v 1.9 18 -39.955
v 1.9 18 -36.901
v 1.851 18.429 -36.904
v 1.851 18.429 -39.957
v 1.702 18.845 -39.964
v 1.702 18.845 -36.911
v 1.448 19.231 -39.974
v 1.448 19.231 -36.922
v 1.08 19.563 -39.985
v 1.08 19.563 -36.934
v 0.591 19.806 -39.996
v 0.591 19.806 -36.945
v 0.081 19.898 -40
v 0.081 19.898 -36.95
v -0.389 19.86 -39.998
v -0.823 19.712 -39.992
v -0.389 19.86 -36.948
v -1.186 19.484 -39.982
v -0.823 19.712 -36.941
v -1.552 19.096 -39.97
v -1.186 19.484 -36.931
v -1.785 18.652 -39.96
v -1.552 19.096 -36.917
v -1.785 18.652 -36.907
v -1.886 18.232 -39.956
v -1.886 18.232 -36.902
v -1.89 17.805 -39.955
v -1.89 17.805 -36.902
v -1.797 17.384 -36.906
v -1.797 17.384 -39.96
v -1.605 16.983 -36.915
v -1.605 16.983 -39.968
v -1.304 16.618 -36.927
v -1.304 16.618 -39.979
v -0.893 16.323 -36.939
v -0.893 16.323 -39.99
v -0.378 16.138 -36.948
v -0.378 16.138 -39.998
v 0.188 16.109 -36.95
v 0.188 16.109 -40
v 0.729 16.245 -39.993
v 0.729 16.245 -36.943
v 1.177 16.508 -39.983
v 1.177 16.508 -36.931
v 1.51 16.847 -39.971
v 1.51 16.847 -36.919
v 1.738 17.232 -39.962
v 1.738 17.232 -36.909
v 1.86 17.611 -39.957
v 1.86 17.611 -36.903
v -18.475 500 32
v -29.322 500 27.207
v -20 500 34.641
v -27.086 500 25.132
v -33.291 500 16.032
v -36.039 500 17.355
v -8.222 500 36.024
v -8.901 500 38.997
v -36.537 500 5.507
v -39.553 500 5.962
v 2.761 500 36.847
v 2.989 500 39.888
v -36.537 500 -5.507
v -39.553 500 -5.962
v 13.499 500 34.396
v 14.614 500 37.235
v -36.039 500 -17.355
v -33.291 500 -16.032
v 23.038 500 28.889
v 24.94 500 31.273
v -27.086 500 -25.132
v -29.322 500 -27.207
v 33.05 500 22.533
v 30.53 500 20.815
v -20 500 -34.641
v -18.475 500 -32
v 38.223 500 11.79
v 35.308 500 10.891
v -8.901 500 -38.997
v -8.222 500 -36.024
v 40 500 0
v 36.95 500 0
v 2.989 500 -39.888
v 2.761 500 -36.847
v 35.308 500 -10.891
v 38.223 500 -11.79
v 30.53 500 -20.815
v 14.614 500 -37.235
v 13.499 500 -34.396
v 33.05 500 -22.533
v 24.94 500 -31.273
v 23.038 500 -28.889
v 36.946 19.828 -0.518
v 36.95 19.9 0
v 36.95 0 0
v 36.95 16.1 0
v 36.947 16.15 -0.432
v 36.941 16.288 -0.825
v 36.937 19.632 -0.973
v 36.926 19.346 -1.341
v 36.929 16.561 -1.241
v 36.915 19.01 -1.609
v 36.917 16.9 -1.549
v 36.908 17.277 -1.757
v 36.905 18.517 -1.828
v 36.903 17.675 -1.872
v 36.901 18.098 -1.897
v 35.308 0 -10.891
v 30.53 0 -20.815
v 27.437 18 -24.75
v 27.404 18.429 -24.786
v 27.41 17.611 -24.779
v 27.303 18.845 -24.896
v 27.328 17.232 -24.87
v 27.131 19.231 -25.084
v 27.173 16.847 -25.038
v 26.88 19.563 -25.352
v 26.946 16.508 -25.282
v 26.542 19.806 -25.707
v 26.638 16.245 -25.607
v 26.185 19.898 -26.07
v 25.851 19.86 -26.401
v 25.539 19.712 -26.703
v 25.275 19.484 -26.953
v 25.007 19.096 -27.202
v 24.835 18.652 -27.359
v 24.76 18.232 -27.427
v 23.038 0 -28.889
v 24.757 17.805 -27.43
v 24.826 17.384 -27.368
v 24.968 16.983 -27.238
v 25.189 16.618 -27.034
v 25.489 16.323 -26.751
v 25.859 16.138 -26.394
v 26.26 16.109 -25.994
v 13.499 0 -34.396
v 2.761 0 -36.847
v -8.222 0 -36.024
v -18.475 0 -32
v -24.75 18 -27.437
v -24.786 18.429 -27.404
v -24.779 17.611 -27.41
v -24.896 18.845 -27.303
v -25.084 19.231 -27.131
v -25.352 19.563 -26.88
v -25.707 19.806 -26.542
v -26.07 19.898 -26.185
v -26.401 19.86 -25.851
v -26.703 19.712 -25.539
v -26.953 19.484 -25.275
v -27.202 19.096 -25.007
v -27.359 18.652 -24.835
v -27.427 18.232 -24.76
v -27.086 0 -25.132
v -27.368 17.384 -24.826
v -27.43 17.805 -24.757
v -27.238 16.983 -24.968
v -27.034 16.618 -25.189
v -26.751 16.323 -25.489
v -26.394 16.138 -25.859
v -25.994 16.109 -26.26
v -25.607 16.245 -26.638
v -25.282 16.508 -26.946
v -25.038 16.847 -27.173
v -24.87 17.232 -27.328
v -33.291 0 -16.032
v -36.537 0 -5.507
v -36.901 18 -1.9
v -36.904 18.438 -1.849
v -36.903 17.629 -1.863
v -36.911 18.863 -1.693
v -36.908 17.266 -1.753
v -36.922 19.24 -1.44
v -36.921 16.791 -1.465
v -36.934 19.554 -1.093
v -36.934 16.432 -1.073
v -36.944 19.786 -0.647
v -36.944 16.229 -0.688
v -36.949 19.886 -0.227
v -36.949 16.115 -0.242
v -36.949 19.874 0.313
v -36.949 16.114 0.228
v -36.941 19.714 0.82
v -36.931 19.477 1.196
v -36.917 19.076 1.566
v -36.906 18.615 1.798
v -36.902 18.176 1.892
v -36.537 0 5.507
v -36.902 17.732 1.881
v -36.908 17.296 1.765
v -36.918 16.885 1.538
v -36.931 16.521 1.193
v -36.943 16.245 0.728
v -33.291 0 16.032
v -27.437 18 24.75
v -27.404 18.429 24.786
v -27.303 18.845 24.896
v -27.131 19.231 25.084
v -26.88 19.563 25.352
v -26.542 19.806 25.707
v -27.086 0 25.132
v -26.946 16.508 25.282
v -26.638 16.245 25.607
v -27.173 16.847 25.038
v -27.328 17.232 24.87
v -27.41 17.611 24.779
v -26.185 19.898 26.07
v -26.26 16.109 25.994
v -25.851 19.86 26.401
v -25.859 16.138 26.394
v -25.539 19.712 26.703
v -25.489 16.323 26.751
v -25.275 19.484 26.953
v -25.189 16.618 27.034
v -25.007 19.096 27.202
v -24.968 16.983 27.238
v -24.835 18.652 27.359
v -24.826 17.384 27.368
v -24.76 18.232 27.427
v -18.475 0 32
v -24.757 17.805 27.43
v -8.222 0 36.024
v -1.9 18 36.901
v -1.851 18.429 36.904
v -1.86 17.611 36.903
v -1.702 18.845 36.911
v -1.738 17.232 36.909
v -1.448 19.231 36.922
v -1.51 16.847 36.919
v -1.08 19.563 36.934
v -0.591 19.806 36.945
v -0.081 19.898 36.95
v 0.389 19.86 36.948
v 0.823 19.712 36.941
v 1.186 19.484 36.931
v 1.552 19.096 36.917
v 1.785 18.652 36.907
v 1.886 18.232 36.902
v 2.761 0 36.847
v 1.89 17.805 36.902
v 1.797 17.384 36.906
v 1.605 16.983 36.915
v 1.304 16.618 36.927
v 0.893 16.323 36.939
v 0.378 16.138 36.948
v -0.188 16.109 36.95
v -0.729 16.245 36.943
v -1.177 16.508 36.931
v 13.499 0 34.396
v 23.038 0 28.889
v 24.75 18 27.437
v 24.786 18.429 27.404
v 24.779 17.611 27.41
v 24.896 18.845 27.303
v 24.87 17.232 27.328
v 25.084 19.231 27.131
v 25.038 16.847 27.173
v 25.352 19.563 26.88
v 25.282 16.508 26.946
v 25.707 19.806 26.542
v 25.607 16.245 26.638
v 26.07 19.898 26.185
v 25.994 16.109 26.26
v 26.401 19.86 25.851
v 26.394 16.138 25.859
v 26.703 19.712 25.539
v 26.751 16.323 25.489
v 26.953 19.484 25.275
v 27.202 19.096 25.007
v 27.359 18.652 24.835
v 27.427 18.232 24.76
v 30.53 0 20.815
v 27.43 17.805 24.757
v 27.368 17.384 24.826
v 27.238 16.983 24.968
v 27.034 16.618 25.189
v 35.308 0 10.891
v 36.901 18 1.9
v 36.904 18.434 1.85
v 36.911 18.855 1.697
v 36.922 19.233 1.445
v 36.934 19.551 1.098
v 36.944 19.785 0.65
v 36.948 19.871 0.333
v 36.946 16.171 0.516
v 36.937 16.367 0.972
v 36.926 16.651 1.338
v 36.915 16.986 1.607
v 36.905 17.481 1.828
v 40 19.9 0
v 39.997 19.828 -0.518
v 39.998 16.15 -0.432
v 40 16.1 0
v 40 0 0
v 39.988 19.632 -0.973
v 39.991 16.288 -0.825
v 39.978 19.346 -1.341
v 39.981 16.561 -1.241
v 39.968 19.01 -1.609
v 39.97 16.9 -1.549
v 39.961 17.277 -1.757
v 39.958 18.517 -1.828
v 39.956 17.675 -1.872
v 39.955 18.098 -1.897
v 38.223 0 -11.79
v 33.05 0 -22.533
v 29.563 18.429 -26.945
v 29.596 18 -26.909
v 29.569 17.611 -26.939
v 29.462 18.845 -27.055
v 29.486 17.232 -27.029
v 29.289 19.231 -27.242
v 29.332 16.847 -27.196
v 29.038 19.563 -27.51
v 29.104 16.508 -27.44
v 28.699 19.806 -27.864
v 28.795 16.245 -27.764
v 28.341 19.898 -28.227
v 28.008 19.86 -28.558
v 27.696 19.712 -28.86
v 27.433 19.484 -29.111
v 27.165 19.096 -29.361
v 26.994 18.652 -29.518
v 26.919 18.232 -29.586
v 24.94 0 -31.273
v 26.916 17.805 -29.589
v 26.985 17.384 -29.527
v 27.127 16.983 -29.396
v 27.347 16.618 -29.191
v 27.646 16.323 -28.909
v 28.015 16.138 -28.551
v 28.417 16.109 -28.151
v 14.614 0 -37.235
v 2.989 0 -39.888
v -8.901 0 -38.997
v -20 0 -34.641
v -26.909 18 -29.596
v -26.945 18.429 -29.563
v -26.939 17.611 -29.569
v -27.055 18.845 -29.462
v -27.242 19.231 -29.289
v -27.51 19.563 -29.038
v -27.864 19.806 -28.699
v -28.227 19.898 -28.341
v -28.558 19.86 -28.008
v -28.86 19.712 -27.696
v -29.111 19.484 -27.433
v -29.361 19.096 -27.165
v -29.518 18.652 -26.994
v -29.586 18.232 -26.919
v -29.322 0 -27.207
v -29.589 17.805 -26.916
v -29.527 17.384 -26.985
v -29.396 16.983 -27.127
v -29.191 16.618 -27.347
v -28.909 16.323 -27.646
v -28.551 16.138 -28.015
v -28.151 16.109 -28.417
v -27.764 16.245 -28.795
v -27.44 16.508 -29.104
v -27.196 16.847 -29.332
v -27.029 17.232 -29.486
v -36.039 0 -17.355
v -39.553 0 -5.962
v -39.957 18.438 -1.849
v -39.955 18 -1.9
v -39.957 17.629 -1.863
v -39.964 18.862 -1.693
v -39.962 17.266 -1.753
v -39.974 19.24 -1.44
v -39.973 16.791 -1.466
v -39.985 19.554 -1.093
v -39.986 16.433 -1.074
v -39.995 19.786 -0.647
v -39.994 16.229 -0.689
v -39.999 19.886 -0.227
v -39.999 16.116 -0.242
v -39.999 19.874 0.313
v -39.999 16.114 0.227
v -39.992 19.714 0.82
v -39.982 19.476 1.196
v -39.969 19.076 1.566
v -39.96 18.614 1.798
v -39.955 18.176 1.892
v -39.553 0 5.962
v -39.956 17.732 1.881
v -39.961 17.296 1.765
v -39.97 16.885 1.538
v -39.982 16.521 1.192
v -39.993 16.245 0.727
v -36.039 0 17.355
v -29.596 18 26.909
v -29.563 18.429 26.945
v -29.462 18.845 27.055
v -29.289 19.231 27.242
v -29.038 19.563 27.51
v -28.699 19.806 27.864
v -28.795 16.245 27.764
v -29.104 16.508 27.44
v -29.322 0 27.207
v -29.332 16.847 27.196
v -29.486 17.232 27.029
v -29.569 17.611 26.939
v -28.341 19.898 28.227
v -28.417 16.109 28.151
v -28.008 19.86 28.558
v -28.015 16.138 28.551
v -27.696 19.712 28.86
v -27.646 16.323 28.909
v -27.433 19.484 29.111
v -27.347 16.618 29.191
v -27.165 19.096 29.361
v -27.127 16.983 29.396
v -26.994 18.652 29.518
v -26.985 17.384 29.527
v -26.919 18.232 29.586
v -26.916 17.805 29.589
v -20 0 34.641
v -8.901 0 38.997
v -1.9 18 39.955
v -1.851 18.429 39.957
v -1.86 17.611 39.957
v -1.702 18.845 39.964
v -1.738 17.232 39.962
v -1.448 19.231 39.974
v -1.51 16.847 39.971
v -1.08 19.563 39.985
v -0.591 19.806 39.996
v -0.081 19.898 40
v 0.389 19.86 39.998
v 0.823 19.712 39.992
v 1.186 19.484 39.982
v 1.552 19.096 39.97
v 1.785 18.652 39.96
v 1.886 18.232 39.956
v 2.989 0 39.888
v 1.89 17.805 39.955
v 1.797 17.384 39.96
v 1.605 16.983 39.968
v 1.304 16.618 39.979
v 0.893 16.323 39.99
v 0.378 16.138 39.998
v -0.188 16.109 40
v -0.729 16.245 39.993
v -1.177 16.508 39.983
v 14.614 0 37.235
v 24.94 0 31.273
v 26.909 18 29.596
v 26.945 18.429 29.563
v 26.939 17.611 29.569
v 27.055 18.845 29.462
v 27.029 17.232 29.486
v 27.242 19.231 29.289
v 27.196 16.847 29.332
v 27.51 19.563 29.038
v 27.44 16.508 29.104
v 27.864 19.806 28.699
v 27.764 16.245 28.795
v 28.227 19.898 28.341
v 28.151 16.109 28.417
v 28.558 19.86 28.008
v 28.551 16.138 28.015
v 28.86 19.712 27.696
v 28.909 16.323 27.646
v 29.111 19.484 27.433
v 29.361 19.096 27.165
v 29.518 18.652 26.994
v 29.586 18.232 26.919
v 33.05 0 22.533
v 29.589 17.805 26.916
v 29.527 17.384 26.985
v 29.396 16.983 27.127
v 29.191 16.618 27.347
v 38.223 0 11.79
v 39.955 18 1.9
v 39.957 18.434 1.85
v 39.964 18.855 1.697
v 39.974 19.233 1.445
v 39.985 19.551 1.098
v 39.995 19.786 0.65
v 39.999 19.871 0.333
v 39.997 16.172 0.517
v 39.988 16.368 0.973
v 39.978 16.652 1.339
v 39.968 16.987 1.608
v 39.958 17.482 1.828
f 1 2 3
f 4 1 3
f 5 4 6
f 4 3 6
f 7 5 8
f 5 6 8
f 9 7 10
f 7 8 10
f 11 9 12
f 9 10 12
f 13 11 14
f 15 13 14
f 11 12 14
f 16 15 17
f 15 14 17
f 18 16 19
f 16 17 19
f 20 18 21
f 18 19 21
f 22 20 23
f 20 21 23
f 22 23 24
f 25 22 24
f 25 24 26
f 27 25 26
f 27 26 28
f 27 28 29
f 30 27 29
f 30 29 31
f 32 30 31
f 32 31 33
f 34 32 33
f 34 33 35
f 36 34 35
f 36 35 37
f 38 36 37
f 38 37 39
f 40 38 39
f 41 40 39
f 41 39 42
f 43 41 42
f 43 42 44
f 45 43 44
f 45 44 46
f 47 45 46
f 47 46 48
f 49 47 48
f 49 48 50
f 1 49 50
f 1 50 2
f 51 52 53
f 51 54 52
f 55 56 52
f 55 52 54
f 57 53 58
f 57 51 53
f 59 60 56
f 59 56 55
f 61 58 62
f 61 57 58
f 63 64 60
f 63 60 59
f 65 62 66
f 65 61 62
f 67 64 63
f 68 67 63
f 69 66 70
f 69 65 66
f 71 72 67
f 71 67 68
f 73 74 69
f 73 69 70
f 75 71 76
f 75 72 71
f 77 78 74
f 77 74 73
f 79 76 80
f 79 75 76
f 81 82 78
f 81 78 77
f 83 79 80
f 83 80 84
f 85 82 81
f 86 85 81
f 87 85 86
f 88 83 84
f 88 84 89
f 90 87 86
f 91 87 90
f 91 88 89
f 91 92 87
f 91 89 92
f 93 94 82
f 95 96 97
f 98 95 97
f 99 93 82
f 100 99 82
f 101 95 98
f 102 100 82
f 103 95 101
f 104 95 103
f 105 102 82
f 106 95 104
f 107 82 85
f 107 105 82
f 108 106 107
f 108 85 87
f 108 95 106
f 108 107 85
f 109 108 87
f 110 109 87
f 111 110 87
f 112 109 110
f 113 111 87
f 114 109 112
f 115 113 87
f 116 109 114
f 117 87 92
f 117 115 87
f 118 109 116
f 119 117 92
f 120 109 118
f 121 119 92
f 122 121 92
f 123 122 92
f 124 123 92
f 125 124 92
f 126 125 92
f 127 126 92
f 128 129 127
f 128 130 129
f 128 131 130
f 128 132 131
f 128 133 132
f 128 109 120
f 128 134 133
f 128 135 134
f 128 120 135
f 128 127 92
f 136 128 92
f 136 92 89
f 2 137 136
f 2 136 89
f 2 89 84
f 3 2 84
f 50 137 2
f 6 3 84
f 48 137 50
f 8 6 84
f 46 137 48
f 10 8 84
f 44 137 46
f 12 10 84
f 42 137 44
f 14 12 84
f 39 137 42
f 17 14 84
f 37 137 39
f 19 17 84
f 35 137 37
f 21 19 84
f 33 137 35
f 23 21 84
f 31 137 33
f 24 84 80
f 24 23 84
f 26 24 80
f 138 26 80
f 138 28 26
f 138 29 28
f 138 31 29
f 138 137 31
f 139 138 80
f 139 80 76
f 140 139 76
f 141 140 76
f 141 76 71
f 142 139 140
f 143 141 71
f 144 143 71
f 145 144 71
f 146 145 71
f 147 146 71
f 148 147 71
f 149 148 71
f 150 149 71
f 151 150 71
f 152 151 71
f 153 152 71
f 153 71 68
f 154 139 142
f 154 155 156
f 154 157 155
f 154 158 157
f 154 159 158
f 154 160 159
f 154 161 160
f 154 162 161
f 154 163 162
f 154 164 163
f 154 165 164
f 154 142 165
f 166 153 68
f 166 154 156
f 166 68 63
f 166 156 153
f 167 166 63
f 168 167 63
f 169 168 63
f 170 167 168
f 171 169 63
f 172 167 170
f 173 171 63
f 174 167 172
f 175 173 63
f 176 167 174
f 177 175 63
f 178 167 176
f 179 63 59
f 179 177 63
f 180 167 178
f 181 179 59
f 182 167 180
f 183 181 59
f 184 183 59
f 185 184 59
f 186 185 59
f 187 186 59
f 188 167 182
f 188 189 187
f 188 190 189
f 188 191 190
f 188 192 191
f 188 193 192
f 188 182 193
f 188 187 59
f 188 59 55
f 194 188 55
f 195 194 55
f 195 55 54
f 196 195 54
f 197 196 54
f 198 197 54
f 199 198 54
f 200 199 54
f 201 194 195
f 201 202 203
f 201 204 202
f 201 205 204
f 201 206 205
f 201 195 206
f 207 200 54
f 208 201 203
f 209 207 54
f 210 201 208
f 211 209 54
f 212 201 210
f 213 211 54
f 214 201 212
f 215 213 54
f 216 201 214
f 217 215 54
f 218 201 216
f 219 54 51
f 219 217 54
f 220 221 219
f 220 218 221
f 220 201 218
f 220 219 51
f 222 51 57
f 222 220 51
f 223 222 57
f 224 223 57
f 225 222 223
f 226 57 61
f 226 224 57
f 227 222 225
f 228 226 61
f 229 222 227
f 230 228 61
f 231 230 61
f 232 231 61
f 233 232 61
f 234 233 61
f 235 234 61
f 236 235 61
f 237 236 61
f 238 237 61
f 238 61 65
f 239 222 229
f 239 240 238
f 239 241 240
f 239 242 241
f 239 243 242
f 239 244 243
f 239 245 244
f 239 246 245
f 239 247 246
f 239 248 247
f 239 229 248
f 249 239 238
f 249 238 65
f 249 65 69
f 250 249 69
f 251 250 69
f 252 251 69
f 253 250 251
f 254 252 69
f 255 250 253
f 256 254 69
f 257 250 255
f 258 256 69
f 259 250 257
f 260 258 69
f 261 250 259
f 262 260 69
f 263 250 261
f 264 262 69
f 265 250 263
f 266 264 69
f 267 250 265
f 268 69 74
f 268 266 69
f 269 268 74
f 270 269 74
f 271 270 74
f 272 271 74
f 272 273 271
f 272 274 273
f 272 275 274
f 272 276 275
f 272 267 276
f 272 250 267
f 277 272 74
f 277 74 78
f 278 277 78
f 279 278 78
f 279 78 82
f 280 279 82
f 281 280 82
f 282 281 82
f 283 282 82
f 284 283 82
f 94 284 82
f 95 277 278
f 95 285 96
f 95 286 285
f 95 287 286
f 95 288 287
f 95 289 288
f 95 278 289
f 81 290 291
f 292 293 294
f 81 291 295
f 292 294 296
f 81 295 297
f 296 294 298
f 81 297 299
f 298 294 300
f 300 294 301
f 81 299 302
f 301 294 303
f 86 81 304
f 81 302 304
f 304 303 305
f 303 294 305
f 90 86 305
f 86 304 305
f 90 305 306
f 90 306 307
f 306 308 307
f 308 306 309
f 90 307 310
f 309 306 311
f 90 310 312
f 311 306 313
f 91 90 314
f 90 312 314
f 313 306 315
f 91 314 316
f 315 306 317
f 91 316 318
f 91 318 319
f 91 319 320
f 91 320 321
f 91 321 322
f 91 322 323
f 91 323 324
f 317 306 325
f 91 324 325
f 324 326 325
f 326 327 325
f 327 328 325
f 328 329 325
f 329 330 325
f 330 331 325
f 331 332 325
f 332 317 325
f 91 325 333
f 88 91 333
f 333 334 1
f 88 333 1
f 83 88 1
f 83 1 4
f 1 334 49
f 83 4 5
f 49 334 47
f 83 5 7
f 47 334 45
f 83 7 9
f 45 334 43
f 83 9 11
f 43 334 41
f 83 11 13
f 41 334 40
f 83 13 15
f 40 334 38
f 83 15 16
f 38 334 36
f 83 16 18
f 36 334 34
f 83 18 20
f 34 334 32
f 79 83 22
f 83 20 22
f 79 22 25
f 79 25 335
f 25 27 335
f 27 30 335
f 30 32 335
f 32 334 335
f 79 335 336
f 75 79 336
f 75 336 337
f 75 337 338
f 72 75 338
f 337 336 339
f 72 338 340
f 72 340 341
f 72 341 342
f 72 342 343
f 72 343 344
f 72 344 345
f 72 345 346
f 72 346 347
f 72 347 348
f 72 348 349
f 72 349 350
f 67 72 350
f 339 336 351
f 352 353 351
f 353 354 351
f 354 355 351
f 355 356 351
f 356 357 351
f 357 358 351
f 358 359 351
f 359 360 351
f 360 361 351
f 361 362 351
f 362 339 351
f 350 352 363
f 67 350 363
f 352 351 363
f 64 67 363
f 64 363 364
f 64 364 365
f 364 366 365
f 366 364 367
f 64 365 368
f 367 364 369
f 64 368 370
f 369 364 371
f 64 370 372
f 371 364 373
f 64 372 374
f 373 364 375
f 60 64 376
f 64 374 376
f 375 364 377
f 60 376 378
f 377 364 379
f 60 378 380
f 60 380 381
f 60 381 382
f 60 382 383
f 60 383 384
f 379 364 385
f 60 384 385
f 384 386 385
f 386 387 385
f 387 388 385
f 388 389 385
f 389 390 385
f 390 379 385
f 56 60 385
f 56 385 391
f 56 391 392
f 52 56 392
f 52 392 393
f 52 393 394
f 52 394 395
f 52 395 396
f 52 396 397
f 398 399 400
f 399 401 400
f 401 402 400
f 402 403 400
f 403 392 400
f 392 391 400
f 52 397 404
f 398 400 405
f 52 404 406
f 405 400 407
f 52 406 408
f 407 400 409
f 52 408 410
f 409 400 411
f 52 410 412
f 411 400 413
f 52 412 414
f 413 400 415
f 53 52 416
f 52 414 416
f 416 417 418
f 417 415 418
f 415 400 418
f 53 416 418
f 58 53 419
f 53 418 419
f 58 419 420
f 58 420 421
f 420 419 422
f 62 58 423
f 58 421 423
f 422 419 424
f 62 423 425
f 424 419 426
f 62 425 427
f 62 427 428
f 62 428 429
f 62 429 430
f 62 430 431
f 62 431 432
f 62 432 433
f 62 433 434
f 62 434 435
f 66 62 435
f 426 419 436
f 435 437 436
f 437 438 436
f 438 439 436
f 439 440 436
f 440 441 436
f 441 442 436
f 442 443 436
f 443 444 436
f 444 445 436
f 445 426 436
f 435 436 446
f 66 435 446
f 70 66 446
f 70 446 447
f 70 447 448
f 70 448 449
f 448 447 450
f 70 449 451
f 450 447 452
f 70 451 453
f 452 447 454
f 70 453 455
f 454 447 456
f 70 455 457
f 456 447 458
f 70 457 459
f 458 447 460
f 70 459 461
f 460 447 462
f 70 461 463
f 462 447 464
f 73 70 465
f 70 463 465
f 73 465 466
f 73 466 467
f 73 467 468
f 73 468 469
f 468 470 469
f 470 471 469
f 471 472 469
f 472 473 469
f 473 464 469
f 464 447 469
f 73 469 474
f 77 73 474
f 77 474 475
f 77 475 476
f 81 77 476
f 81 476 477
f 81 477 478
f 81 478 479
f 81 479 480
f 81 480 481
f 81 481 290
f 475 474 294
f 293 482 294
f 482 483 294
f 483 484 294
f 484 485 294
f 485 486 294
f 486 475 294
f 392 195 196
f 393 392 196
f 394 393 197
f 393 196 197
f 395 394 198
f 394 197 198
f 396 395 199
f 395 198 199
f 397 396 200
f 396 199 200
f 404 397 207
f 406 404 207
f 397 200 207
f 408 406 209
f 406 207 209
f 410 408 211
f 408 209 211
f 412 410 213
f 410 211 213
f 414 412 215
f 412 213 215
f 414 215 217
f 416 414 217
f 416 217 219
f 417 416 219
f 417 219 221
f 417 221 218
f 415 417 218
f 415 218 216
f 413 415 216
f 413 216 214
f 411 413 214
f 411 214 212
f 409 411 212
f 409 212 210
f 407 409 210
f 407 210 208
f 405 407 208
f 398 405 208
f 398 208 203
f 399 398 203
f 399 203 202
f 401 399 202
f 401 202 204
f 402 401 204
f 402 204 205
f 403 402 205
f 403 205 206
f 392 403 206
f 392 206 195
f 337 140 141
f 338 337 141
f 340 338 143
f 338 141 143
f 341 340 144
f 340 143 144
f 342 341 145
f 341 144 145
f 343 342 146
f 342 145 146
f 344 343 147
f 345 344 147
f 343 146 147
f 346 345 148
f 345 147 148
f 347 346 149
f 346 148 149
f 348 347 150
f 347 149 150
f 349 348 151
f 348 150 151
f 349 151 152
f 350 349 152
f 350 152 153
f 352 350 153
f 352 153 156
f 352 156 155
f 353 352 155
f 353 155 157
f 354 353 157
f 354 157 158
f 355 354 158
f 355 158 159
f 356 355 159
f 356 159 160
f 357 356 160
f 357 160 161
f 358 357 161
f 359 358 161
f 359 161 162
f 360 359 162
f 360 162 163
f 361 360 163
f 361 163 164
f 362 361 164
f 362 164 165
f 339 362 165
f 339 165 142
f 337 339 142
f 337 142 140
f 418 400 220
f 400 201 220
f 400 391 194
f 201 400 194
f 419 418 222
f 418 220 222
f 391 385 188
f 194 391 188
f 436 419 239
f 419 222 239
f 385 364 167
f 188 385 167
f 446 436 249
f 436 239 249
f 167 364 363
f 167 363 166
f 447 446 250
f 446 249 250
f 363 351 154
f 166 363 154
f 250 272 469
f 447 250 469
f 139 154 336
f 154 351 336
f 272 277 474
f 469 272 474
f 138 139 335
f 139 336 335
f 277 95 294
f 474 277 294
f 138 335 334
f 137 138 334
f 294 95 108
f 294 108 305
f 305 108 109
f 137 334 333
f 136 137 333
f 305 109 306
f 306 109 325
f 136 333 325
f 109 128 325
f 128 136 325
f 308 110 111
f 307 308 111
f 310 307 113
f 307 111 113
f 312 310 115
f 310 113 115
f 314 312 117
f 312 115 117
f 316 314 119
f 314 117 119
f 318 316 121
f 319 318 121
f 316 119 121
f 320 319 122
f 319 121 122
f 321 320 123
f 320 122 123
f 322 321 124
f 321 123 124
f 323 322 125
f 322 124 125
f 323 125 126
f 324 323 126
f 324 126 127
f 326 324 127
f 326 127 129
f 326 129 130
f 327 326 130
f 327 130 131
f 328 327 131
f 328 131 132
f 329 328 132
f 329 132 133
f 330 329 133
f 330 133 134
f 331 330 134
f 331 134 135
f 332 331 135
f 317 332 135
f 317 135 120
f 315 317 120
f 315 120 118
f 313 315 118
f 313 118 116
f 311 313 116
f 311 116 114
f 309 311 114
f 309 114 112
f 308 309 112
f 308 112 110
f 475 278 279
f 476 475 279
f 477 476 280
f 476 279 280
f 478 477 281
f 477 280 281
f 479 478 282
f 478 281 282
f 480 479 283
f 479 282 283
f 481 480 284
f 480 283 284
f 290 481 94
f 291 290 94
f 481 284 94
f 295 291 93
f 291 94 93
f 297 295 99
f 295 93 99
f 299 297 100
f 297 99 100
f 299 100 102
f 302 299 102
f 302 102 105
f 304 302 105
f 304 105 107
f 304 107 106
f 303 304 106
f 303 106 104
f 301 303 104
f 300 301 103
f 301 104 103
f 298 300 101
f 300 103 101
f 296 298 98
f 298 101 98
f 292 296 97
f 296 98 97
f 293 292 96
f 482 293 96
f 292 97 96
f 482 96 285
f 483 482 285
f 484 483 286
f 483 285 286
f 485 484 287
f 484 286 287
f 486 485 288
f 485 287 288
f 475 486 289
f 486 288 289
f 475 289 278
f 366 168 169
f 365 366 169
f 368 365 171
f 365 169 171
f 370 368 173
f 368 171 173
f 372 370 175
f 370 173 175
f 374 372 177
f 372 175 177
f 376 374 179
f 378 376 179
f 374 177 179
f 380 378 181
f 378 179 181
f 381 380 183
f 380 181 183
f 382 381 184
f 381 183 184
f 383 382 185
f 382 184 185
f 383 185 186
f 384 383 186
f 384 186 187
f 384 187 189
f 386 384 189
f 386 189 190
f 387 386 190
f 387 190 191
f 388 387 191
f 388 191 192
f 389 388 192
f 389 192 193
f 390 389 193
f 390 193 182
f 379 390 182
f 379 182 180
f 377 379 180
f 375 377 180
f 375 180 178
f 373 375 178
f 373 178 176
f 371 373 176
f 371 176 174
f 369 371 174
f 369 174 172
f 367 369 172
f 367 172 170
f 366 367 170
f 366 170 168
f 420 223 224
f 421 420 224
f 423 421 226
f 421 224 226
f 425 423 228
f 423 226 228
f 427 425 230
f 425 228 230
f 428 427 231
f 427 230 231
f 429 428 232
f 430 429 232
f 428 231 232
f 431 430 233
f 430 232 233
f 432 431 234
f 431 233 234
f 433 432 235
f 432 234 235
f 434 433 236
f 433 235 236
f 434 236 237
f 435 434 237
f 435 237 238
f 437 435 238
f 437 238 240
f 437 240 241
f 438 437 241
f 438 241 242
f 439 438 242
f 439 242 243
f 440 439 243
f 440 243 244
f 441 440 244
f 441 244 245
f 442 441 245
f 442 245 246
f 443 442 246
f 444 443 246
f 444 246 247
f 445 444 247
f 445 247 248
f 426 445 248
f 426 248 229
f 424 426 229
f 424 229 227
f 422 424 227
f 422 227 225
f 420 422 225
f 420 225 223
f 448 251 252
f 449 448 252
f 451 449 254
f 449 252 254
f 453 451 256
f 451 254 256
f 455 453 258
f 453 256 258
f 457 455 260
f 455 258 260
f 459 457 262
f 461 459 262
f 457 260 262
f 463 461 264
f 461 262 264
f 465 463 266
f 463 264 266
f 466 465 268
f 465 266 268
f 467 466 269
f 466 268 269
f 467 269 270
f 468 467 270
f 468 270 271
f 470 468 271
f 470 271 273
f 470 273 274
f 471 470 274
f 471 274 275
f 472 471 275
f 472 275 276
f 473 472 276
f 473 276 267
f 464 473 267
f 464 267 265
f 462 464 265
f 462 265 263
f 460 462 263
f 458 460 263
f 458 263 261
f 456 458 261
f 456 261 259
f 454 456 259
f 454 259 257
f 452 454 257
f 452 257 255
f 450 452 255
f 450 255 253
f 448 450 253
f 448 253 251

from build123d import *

# Parameters (mm, degrees)
SKETCH1_R           = 40
SKETCH1_R_2         = 36.95
BOSS_EXTRUDE1_DEPTH = 500
SKETCH2_R           = 1.9
CUT_EXTRUDE1_DEPTH  = 66
CIRPATTERN2_COUNT   = 8


with BuildPart() as part:
    # Sketch1 → Boss-Extrude1 (new body)
    with BuildSketch(Plane(origin=(0, 0, 0), x_dir=(1, 0, 0), z_dir=(0, 1, 0))):
        Circle(SKETCH1_R)
        Circle(SKETCH1_R_2, mode=Mode.SUBTRACT)
    extrude(amount=BOSS_EXTRUDE1_DEPTH)

    # Sketch2 → Cut-Extrude1 (cut)
    with BuildSketch(Plane.XY):
        with Locations((0, 18)):
            Circle(SKETCH2_R)
    cut_extrude1 = extrude(amount=-CUT_EXTRUDE1_DEPTH, mode=Mode.SUBTRACT)

    # CirPattern2: Cut-Extrude1 ×8 about axis
    cirpattern2_axis = Axis((0, 500, 0), (0, -1, 0))
    for i in range(1, CIRPATTERN2_COUNT):
        add(cut_extrude1.rotate(cirpattern2_axis, i * 360 / CIRPATTERN2_COUNT), mode=Mode.SUBTRACT)


solid = part.part
